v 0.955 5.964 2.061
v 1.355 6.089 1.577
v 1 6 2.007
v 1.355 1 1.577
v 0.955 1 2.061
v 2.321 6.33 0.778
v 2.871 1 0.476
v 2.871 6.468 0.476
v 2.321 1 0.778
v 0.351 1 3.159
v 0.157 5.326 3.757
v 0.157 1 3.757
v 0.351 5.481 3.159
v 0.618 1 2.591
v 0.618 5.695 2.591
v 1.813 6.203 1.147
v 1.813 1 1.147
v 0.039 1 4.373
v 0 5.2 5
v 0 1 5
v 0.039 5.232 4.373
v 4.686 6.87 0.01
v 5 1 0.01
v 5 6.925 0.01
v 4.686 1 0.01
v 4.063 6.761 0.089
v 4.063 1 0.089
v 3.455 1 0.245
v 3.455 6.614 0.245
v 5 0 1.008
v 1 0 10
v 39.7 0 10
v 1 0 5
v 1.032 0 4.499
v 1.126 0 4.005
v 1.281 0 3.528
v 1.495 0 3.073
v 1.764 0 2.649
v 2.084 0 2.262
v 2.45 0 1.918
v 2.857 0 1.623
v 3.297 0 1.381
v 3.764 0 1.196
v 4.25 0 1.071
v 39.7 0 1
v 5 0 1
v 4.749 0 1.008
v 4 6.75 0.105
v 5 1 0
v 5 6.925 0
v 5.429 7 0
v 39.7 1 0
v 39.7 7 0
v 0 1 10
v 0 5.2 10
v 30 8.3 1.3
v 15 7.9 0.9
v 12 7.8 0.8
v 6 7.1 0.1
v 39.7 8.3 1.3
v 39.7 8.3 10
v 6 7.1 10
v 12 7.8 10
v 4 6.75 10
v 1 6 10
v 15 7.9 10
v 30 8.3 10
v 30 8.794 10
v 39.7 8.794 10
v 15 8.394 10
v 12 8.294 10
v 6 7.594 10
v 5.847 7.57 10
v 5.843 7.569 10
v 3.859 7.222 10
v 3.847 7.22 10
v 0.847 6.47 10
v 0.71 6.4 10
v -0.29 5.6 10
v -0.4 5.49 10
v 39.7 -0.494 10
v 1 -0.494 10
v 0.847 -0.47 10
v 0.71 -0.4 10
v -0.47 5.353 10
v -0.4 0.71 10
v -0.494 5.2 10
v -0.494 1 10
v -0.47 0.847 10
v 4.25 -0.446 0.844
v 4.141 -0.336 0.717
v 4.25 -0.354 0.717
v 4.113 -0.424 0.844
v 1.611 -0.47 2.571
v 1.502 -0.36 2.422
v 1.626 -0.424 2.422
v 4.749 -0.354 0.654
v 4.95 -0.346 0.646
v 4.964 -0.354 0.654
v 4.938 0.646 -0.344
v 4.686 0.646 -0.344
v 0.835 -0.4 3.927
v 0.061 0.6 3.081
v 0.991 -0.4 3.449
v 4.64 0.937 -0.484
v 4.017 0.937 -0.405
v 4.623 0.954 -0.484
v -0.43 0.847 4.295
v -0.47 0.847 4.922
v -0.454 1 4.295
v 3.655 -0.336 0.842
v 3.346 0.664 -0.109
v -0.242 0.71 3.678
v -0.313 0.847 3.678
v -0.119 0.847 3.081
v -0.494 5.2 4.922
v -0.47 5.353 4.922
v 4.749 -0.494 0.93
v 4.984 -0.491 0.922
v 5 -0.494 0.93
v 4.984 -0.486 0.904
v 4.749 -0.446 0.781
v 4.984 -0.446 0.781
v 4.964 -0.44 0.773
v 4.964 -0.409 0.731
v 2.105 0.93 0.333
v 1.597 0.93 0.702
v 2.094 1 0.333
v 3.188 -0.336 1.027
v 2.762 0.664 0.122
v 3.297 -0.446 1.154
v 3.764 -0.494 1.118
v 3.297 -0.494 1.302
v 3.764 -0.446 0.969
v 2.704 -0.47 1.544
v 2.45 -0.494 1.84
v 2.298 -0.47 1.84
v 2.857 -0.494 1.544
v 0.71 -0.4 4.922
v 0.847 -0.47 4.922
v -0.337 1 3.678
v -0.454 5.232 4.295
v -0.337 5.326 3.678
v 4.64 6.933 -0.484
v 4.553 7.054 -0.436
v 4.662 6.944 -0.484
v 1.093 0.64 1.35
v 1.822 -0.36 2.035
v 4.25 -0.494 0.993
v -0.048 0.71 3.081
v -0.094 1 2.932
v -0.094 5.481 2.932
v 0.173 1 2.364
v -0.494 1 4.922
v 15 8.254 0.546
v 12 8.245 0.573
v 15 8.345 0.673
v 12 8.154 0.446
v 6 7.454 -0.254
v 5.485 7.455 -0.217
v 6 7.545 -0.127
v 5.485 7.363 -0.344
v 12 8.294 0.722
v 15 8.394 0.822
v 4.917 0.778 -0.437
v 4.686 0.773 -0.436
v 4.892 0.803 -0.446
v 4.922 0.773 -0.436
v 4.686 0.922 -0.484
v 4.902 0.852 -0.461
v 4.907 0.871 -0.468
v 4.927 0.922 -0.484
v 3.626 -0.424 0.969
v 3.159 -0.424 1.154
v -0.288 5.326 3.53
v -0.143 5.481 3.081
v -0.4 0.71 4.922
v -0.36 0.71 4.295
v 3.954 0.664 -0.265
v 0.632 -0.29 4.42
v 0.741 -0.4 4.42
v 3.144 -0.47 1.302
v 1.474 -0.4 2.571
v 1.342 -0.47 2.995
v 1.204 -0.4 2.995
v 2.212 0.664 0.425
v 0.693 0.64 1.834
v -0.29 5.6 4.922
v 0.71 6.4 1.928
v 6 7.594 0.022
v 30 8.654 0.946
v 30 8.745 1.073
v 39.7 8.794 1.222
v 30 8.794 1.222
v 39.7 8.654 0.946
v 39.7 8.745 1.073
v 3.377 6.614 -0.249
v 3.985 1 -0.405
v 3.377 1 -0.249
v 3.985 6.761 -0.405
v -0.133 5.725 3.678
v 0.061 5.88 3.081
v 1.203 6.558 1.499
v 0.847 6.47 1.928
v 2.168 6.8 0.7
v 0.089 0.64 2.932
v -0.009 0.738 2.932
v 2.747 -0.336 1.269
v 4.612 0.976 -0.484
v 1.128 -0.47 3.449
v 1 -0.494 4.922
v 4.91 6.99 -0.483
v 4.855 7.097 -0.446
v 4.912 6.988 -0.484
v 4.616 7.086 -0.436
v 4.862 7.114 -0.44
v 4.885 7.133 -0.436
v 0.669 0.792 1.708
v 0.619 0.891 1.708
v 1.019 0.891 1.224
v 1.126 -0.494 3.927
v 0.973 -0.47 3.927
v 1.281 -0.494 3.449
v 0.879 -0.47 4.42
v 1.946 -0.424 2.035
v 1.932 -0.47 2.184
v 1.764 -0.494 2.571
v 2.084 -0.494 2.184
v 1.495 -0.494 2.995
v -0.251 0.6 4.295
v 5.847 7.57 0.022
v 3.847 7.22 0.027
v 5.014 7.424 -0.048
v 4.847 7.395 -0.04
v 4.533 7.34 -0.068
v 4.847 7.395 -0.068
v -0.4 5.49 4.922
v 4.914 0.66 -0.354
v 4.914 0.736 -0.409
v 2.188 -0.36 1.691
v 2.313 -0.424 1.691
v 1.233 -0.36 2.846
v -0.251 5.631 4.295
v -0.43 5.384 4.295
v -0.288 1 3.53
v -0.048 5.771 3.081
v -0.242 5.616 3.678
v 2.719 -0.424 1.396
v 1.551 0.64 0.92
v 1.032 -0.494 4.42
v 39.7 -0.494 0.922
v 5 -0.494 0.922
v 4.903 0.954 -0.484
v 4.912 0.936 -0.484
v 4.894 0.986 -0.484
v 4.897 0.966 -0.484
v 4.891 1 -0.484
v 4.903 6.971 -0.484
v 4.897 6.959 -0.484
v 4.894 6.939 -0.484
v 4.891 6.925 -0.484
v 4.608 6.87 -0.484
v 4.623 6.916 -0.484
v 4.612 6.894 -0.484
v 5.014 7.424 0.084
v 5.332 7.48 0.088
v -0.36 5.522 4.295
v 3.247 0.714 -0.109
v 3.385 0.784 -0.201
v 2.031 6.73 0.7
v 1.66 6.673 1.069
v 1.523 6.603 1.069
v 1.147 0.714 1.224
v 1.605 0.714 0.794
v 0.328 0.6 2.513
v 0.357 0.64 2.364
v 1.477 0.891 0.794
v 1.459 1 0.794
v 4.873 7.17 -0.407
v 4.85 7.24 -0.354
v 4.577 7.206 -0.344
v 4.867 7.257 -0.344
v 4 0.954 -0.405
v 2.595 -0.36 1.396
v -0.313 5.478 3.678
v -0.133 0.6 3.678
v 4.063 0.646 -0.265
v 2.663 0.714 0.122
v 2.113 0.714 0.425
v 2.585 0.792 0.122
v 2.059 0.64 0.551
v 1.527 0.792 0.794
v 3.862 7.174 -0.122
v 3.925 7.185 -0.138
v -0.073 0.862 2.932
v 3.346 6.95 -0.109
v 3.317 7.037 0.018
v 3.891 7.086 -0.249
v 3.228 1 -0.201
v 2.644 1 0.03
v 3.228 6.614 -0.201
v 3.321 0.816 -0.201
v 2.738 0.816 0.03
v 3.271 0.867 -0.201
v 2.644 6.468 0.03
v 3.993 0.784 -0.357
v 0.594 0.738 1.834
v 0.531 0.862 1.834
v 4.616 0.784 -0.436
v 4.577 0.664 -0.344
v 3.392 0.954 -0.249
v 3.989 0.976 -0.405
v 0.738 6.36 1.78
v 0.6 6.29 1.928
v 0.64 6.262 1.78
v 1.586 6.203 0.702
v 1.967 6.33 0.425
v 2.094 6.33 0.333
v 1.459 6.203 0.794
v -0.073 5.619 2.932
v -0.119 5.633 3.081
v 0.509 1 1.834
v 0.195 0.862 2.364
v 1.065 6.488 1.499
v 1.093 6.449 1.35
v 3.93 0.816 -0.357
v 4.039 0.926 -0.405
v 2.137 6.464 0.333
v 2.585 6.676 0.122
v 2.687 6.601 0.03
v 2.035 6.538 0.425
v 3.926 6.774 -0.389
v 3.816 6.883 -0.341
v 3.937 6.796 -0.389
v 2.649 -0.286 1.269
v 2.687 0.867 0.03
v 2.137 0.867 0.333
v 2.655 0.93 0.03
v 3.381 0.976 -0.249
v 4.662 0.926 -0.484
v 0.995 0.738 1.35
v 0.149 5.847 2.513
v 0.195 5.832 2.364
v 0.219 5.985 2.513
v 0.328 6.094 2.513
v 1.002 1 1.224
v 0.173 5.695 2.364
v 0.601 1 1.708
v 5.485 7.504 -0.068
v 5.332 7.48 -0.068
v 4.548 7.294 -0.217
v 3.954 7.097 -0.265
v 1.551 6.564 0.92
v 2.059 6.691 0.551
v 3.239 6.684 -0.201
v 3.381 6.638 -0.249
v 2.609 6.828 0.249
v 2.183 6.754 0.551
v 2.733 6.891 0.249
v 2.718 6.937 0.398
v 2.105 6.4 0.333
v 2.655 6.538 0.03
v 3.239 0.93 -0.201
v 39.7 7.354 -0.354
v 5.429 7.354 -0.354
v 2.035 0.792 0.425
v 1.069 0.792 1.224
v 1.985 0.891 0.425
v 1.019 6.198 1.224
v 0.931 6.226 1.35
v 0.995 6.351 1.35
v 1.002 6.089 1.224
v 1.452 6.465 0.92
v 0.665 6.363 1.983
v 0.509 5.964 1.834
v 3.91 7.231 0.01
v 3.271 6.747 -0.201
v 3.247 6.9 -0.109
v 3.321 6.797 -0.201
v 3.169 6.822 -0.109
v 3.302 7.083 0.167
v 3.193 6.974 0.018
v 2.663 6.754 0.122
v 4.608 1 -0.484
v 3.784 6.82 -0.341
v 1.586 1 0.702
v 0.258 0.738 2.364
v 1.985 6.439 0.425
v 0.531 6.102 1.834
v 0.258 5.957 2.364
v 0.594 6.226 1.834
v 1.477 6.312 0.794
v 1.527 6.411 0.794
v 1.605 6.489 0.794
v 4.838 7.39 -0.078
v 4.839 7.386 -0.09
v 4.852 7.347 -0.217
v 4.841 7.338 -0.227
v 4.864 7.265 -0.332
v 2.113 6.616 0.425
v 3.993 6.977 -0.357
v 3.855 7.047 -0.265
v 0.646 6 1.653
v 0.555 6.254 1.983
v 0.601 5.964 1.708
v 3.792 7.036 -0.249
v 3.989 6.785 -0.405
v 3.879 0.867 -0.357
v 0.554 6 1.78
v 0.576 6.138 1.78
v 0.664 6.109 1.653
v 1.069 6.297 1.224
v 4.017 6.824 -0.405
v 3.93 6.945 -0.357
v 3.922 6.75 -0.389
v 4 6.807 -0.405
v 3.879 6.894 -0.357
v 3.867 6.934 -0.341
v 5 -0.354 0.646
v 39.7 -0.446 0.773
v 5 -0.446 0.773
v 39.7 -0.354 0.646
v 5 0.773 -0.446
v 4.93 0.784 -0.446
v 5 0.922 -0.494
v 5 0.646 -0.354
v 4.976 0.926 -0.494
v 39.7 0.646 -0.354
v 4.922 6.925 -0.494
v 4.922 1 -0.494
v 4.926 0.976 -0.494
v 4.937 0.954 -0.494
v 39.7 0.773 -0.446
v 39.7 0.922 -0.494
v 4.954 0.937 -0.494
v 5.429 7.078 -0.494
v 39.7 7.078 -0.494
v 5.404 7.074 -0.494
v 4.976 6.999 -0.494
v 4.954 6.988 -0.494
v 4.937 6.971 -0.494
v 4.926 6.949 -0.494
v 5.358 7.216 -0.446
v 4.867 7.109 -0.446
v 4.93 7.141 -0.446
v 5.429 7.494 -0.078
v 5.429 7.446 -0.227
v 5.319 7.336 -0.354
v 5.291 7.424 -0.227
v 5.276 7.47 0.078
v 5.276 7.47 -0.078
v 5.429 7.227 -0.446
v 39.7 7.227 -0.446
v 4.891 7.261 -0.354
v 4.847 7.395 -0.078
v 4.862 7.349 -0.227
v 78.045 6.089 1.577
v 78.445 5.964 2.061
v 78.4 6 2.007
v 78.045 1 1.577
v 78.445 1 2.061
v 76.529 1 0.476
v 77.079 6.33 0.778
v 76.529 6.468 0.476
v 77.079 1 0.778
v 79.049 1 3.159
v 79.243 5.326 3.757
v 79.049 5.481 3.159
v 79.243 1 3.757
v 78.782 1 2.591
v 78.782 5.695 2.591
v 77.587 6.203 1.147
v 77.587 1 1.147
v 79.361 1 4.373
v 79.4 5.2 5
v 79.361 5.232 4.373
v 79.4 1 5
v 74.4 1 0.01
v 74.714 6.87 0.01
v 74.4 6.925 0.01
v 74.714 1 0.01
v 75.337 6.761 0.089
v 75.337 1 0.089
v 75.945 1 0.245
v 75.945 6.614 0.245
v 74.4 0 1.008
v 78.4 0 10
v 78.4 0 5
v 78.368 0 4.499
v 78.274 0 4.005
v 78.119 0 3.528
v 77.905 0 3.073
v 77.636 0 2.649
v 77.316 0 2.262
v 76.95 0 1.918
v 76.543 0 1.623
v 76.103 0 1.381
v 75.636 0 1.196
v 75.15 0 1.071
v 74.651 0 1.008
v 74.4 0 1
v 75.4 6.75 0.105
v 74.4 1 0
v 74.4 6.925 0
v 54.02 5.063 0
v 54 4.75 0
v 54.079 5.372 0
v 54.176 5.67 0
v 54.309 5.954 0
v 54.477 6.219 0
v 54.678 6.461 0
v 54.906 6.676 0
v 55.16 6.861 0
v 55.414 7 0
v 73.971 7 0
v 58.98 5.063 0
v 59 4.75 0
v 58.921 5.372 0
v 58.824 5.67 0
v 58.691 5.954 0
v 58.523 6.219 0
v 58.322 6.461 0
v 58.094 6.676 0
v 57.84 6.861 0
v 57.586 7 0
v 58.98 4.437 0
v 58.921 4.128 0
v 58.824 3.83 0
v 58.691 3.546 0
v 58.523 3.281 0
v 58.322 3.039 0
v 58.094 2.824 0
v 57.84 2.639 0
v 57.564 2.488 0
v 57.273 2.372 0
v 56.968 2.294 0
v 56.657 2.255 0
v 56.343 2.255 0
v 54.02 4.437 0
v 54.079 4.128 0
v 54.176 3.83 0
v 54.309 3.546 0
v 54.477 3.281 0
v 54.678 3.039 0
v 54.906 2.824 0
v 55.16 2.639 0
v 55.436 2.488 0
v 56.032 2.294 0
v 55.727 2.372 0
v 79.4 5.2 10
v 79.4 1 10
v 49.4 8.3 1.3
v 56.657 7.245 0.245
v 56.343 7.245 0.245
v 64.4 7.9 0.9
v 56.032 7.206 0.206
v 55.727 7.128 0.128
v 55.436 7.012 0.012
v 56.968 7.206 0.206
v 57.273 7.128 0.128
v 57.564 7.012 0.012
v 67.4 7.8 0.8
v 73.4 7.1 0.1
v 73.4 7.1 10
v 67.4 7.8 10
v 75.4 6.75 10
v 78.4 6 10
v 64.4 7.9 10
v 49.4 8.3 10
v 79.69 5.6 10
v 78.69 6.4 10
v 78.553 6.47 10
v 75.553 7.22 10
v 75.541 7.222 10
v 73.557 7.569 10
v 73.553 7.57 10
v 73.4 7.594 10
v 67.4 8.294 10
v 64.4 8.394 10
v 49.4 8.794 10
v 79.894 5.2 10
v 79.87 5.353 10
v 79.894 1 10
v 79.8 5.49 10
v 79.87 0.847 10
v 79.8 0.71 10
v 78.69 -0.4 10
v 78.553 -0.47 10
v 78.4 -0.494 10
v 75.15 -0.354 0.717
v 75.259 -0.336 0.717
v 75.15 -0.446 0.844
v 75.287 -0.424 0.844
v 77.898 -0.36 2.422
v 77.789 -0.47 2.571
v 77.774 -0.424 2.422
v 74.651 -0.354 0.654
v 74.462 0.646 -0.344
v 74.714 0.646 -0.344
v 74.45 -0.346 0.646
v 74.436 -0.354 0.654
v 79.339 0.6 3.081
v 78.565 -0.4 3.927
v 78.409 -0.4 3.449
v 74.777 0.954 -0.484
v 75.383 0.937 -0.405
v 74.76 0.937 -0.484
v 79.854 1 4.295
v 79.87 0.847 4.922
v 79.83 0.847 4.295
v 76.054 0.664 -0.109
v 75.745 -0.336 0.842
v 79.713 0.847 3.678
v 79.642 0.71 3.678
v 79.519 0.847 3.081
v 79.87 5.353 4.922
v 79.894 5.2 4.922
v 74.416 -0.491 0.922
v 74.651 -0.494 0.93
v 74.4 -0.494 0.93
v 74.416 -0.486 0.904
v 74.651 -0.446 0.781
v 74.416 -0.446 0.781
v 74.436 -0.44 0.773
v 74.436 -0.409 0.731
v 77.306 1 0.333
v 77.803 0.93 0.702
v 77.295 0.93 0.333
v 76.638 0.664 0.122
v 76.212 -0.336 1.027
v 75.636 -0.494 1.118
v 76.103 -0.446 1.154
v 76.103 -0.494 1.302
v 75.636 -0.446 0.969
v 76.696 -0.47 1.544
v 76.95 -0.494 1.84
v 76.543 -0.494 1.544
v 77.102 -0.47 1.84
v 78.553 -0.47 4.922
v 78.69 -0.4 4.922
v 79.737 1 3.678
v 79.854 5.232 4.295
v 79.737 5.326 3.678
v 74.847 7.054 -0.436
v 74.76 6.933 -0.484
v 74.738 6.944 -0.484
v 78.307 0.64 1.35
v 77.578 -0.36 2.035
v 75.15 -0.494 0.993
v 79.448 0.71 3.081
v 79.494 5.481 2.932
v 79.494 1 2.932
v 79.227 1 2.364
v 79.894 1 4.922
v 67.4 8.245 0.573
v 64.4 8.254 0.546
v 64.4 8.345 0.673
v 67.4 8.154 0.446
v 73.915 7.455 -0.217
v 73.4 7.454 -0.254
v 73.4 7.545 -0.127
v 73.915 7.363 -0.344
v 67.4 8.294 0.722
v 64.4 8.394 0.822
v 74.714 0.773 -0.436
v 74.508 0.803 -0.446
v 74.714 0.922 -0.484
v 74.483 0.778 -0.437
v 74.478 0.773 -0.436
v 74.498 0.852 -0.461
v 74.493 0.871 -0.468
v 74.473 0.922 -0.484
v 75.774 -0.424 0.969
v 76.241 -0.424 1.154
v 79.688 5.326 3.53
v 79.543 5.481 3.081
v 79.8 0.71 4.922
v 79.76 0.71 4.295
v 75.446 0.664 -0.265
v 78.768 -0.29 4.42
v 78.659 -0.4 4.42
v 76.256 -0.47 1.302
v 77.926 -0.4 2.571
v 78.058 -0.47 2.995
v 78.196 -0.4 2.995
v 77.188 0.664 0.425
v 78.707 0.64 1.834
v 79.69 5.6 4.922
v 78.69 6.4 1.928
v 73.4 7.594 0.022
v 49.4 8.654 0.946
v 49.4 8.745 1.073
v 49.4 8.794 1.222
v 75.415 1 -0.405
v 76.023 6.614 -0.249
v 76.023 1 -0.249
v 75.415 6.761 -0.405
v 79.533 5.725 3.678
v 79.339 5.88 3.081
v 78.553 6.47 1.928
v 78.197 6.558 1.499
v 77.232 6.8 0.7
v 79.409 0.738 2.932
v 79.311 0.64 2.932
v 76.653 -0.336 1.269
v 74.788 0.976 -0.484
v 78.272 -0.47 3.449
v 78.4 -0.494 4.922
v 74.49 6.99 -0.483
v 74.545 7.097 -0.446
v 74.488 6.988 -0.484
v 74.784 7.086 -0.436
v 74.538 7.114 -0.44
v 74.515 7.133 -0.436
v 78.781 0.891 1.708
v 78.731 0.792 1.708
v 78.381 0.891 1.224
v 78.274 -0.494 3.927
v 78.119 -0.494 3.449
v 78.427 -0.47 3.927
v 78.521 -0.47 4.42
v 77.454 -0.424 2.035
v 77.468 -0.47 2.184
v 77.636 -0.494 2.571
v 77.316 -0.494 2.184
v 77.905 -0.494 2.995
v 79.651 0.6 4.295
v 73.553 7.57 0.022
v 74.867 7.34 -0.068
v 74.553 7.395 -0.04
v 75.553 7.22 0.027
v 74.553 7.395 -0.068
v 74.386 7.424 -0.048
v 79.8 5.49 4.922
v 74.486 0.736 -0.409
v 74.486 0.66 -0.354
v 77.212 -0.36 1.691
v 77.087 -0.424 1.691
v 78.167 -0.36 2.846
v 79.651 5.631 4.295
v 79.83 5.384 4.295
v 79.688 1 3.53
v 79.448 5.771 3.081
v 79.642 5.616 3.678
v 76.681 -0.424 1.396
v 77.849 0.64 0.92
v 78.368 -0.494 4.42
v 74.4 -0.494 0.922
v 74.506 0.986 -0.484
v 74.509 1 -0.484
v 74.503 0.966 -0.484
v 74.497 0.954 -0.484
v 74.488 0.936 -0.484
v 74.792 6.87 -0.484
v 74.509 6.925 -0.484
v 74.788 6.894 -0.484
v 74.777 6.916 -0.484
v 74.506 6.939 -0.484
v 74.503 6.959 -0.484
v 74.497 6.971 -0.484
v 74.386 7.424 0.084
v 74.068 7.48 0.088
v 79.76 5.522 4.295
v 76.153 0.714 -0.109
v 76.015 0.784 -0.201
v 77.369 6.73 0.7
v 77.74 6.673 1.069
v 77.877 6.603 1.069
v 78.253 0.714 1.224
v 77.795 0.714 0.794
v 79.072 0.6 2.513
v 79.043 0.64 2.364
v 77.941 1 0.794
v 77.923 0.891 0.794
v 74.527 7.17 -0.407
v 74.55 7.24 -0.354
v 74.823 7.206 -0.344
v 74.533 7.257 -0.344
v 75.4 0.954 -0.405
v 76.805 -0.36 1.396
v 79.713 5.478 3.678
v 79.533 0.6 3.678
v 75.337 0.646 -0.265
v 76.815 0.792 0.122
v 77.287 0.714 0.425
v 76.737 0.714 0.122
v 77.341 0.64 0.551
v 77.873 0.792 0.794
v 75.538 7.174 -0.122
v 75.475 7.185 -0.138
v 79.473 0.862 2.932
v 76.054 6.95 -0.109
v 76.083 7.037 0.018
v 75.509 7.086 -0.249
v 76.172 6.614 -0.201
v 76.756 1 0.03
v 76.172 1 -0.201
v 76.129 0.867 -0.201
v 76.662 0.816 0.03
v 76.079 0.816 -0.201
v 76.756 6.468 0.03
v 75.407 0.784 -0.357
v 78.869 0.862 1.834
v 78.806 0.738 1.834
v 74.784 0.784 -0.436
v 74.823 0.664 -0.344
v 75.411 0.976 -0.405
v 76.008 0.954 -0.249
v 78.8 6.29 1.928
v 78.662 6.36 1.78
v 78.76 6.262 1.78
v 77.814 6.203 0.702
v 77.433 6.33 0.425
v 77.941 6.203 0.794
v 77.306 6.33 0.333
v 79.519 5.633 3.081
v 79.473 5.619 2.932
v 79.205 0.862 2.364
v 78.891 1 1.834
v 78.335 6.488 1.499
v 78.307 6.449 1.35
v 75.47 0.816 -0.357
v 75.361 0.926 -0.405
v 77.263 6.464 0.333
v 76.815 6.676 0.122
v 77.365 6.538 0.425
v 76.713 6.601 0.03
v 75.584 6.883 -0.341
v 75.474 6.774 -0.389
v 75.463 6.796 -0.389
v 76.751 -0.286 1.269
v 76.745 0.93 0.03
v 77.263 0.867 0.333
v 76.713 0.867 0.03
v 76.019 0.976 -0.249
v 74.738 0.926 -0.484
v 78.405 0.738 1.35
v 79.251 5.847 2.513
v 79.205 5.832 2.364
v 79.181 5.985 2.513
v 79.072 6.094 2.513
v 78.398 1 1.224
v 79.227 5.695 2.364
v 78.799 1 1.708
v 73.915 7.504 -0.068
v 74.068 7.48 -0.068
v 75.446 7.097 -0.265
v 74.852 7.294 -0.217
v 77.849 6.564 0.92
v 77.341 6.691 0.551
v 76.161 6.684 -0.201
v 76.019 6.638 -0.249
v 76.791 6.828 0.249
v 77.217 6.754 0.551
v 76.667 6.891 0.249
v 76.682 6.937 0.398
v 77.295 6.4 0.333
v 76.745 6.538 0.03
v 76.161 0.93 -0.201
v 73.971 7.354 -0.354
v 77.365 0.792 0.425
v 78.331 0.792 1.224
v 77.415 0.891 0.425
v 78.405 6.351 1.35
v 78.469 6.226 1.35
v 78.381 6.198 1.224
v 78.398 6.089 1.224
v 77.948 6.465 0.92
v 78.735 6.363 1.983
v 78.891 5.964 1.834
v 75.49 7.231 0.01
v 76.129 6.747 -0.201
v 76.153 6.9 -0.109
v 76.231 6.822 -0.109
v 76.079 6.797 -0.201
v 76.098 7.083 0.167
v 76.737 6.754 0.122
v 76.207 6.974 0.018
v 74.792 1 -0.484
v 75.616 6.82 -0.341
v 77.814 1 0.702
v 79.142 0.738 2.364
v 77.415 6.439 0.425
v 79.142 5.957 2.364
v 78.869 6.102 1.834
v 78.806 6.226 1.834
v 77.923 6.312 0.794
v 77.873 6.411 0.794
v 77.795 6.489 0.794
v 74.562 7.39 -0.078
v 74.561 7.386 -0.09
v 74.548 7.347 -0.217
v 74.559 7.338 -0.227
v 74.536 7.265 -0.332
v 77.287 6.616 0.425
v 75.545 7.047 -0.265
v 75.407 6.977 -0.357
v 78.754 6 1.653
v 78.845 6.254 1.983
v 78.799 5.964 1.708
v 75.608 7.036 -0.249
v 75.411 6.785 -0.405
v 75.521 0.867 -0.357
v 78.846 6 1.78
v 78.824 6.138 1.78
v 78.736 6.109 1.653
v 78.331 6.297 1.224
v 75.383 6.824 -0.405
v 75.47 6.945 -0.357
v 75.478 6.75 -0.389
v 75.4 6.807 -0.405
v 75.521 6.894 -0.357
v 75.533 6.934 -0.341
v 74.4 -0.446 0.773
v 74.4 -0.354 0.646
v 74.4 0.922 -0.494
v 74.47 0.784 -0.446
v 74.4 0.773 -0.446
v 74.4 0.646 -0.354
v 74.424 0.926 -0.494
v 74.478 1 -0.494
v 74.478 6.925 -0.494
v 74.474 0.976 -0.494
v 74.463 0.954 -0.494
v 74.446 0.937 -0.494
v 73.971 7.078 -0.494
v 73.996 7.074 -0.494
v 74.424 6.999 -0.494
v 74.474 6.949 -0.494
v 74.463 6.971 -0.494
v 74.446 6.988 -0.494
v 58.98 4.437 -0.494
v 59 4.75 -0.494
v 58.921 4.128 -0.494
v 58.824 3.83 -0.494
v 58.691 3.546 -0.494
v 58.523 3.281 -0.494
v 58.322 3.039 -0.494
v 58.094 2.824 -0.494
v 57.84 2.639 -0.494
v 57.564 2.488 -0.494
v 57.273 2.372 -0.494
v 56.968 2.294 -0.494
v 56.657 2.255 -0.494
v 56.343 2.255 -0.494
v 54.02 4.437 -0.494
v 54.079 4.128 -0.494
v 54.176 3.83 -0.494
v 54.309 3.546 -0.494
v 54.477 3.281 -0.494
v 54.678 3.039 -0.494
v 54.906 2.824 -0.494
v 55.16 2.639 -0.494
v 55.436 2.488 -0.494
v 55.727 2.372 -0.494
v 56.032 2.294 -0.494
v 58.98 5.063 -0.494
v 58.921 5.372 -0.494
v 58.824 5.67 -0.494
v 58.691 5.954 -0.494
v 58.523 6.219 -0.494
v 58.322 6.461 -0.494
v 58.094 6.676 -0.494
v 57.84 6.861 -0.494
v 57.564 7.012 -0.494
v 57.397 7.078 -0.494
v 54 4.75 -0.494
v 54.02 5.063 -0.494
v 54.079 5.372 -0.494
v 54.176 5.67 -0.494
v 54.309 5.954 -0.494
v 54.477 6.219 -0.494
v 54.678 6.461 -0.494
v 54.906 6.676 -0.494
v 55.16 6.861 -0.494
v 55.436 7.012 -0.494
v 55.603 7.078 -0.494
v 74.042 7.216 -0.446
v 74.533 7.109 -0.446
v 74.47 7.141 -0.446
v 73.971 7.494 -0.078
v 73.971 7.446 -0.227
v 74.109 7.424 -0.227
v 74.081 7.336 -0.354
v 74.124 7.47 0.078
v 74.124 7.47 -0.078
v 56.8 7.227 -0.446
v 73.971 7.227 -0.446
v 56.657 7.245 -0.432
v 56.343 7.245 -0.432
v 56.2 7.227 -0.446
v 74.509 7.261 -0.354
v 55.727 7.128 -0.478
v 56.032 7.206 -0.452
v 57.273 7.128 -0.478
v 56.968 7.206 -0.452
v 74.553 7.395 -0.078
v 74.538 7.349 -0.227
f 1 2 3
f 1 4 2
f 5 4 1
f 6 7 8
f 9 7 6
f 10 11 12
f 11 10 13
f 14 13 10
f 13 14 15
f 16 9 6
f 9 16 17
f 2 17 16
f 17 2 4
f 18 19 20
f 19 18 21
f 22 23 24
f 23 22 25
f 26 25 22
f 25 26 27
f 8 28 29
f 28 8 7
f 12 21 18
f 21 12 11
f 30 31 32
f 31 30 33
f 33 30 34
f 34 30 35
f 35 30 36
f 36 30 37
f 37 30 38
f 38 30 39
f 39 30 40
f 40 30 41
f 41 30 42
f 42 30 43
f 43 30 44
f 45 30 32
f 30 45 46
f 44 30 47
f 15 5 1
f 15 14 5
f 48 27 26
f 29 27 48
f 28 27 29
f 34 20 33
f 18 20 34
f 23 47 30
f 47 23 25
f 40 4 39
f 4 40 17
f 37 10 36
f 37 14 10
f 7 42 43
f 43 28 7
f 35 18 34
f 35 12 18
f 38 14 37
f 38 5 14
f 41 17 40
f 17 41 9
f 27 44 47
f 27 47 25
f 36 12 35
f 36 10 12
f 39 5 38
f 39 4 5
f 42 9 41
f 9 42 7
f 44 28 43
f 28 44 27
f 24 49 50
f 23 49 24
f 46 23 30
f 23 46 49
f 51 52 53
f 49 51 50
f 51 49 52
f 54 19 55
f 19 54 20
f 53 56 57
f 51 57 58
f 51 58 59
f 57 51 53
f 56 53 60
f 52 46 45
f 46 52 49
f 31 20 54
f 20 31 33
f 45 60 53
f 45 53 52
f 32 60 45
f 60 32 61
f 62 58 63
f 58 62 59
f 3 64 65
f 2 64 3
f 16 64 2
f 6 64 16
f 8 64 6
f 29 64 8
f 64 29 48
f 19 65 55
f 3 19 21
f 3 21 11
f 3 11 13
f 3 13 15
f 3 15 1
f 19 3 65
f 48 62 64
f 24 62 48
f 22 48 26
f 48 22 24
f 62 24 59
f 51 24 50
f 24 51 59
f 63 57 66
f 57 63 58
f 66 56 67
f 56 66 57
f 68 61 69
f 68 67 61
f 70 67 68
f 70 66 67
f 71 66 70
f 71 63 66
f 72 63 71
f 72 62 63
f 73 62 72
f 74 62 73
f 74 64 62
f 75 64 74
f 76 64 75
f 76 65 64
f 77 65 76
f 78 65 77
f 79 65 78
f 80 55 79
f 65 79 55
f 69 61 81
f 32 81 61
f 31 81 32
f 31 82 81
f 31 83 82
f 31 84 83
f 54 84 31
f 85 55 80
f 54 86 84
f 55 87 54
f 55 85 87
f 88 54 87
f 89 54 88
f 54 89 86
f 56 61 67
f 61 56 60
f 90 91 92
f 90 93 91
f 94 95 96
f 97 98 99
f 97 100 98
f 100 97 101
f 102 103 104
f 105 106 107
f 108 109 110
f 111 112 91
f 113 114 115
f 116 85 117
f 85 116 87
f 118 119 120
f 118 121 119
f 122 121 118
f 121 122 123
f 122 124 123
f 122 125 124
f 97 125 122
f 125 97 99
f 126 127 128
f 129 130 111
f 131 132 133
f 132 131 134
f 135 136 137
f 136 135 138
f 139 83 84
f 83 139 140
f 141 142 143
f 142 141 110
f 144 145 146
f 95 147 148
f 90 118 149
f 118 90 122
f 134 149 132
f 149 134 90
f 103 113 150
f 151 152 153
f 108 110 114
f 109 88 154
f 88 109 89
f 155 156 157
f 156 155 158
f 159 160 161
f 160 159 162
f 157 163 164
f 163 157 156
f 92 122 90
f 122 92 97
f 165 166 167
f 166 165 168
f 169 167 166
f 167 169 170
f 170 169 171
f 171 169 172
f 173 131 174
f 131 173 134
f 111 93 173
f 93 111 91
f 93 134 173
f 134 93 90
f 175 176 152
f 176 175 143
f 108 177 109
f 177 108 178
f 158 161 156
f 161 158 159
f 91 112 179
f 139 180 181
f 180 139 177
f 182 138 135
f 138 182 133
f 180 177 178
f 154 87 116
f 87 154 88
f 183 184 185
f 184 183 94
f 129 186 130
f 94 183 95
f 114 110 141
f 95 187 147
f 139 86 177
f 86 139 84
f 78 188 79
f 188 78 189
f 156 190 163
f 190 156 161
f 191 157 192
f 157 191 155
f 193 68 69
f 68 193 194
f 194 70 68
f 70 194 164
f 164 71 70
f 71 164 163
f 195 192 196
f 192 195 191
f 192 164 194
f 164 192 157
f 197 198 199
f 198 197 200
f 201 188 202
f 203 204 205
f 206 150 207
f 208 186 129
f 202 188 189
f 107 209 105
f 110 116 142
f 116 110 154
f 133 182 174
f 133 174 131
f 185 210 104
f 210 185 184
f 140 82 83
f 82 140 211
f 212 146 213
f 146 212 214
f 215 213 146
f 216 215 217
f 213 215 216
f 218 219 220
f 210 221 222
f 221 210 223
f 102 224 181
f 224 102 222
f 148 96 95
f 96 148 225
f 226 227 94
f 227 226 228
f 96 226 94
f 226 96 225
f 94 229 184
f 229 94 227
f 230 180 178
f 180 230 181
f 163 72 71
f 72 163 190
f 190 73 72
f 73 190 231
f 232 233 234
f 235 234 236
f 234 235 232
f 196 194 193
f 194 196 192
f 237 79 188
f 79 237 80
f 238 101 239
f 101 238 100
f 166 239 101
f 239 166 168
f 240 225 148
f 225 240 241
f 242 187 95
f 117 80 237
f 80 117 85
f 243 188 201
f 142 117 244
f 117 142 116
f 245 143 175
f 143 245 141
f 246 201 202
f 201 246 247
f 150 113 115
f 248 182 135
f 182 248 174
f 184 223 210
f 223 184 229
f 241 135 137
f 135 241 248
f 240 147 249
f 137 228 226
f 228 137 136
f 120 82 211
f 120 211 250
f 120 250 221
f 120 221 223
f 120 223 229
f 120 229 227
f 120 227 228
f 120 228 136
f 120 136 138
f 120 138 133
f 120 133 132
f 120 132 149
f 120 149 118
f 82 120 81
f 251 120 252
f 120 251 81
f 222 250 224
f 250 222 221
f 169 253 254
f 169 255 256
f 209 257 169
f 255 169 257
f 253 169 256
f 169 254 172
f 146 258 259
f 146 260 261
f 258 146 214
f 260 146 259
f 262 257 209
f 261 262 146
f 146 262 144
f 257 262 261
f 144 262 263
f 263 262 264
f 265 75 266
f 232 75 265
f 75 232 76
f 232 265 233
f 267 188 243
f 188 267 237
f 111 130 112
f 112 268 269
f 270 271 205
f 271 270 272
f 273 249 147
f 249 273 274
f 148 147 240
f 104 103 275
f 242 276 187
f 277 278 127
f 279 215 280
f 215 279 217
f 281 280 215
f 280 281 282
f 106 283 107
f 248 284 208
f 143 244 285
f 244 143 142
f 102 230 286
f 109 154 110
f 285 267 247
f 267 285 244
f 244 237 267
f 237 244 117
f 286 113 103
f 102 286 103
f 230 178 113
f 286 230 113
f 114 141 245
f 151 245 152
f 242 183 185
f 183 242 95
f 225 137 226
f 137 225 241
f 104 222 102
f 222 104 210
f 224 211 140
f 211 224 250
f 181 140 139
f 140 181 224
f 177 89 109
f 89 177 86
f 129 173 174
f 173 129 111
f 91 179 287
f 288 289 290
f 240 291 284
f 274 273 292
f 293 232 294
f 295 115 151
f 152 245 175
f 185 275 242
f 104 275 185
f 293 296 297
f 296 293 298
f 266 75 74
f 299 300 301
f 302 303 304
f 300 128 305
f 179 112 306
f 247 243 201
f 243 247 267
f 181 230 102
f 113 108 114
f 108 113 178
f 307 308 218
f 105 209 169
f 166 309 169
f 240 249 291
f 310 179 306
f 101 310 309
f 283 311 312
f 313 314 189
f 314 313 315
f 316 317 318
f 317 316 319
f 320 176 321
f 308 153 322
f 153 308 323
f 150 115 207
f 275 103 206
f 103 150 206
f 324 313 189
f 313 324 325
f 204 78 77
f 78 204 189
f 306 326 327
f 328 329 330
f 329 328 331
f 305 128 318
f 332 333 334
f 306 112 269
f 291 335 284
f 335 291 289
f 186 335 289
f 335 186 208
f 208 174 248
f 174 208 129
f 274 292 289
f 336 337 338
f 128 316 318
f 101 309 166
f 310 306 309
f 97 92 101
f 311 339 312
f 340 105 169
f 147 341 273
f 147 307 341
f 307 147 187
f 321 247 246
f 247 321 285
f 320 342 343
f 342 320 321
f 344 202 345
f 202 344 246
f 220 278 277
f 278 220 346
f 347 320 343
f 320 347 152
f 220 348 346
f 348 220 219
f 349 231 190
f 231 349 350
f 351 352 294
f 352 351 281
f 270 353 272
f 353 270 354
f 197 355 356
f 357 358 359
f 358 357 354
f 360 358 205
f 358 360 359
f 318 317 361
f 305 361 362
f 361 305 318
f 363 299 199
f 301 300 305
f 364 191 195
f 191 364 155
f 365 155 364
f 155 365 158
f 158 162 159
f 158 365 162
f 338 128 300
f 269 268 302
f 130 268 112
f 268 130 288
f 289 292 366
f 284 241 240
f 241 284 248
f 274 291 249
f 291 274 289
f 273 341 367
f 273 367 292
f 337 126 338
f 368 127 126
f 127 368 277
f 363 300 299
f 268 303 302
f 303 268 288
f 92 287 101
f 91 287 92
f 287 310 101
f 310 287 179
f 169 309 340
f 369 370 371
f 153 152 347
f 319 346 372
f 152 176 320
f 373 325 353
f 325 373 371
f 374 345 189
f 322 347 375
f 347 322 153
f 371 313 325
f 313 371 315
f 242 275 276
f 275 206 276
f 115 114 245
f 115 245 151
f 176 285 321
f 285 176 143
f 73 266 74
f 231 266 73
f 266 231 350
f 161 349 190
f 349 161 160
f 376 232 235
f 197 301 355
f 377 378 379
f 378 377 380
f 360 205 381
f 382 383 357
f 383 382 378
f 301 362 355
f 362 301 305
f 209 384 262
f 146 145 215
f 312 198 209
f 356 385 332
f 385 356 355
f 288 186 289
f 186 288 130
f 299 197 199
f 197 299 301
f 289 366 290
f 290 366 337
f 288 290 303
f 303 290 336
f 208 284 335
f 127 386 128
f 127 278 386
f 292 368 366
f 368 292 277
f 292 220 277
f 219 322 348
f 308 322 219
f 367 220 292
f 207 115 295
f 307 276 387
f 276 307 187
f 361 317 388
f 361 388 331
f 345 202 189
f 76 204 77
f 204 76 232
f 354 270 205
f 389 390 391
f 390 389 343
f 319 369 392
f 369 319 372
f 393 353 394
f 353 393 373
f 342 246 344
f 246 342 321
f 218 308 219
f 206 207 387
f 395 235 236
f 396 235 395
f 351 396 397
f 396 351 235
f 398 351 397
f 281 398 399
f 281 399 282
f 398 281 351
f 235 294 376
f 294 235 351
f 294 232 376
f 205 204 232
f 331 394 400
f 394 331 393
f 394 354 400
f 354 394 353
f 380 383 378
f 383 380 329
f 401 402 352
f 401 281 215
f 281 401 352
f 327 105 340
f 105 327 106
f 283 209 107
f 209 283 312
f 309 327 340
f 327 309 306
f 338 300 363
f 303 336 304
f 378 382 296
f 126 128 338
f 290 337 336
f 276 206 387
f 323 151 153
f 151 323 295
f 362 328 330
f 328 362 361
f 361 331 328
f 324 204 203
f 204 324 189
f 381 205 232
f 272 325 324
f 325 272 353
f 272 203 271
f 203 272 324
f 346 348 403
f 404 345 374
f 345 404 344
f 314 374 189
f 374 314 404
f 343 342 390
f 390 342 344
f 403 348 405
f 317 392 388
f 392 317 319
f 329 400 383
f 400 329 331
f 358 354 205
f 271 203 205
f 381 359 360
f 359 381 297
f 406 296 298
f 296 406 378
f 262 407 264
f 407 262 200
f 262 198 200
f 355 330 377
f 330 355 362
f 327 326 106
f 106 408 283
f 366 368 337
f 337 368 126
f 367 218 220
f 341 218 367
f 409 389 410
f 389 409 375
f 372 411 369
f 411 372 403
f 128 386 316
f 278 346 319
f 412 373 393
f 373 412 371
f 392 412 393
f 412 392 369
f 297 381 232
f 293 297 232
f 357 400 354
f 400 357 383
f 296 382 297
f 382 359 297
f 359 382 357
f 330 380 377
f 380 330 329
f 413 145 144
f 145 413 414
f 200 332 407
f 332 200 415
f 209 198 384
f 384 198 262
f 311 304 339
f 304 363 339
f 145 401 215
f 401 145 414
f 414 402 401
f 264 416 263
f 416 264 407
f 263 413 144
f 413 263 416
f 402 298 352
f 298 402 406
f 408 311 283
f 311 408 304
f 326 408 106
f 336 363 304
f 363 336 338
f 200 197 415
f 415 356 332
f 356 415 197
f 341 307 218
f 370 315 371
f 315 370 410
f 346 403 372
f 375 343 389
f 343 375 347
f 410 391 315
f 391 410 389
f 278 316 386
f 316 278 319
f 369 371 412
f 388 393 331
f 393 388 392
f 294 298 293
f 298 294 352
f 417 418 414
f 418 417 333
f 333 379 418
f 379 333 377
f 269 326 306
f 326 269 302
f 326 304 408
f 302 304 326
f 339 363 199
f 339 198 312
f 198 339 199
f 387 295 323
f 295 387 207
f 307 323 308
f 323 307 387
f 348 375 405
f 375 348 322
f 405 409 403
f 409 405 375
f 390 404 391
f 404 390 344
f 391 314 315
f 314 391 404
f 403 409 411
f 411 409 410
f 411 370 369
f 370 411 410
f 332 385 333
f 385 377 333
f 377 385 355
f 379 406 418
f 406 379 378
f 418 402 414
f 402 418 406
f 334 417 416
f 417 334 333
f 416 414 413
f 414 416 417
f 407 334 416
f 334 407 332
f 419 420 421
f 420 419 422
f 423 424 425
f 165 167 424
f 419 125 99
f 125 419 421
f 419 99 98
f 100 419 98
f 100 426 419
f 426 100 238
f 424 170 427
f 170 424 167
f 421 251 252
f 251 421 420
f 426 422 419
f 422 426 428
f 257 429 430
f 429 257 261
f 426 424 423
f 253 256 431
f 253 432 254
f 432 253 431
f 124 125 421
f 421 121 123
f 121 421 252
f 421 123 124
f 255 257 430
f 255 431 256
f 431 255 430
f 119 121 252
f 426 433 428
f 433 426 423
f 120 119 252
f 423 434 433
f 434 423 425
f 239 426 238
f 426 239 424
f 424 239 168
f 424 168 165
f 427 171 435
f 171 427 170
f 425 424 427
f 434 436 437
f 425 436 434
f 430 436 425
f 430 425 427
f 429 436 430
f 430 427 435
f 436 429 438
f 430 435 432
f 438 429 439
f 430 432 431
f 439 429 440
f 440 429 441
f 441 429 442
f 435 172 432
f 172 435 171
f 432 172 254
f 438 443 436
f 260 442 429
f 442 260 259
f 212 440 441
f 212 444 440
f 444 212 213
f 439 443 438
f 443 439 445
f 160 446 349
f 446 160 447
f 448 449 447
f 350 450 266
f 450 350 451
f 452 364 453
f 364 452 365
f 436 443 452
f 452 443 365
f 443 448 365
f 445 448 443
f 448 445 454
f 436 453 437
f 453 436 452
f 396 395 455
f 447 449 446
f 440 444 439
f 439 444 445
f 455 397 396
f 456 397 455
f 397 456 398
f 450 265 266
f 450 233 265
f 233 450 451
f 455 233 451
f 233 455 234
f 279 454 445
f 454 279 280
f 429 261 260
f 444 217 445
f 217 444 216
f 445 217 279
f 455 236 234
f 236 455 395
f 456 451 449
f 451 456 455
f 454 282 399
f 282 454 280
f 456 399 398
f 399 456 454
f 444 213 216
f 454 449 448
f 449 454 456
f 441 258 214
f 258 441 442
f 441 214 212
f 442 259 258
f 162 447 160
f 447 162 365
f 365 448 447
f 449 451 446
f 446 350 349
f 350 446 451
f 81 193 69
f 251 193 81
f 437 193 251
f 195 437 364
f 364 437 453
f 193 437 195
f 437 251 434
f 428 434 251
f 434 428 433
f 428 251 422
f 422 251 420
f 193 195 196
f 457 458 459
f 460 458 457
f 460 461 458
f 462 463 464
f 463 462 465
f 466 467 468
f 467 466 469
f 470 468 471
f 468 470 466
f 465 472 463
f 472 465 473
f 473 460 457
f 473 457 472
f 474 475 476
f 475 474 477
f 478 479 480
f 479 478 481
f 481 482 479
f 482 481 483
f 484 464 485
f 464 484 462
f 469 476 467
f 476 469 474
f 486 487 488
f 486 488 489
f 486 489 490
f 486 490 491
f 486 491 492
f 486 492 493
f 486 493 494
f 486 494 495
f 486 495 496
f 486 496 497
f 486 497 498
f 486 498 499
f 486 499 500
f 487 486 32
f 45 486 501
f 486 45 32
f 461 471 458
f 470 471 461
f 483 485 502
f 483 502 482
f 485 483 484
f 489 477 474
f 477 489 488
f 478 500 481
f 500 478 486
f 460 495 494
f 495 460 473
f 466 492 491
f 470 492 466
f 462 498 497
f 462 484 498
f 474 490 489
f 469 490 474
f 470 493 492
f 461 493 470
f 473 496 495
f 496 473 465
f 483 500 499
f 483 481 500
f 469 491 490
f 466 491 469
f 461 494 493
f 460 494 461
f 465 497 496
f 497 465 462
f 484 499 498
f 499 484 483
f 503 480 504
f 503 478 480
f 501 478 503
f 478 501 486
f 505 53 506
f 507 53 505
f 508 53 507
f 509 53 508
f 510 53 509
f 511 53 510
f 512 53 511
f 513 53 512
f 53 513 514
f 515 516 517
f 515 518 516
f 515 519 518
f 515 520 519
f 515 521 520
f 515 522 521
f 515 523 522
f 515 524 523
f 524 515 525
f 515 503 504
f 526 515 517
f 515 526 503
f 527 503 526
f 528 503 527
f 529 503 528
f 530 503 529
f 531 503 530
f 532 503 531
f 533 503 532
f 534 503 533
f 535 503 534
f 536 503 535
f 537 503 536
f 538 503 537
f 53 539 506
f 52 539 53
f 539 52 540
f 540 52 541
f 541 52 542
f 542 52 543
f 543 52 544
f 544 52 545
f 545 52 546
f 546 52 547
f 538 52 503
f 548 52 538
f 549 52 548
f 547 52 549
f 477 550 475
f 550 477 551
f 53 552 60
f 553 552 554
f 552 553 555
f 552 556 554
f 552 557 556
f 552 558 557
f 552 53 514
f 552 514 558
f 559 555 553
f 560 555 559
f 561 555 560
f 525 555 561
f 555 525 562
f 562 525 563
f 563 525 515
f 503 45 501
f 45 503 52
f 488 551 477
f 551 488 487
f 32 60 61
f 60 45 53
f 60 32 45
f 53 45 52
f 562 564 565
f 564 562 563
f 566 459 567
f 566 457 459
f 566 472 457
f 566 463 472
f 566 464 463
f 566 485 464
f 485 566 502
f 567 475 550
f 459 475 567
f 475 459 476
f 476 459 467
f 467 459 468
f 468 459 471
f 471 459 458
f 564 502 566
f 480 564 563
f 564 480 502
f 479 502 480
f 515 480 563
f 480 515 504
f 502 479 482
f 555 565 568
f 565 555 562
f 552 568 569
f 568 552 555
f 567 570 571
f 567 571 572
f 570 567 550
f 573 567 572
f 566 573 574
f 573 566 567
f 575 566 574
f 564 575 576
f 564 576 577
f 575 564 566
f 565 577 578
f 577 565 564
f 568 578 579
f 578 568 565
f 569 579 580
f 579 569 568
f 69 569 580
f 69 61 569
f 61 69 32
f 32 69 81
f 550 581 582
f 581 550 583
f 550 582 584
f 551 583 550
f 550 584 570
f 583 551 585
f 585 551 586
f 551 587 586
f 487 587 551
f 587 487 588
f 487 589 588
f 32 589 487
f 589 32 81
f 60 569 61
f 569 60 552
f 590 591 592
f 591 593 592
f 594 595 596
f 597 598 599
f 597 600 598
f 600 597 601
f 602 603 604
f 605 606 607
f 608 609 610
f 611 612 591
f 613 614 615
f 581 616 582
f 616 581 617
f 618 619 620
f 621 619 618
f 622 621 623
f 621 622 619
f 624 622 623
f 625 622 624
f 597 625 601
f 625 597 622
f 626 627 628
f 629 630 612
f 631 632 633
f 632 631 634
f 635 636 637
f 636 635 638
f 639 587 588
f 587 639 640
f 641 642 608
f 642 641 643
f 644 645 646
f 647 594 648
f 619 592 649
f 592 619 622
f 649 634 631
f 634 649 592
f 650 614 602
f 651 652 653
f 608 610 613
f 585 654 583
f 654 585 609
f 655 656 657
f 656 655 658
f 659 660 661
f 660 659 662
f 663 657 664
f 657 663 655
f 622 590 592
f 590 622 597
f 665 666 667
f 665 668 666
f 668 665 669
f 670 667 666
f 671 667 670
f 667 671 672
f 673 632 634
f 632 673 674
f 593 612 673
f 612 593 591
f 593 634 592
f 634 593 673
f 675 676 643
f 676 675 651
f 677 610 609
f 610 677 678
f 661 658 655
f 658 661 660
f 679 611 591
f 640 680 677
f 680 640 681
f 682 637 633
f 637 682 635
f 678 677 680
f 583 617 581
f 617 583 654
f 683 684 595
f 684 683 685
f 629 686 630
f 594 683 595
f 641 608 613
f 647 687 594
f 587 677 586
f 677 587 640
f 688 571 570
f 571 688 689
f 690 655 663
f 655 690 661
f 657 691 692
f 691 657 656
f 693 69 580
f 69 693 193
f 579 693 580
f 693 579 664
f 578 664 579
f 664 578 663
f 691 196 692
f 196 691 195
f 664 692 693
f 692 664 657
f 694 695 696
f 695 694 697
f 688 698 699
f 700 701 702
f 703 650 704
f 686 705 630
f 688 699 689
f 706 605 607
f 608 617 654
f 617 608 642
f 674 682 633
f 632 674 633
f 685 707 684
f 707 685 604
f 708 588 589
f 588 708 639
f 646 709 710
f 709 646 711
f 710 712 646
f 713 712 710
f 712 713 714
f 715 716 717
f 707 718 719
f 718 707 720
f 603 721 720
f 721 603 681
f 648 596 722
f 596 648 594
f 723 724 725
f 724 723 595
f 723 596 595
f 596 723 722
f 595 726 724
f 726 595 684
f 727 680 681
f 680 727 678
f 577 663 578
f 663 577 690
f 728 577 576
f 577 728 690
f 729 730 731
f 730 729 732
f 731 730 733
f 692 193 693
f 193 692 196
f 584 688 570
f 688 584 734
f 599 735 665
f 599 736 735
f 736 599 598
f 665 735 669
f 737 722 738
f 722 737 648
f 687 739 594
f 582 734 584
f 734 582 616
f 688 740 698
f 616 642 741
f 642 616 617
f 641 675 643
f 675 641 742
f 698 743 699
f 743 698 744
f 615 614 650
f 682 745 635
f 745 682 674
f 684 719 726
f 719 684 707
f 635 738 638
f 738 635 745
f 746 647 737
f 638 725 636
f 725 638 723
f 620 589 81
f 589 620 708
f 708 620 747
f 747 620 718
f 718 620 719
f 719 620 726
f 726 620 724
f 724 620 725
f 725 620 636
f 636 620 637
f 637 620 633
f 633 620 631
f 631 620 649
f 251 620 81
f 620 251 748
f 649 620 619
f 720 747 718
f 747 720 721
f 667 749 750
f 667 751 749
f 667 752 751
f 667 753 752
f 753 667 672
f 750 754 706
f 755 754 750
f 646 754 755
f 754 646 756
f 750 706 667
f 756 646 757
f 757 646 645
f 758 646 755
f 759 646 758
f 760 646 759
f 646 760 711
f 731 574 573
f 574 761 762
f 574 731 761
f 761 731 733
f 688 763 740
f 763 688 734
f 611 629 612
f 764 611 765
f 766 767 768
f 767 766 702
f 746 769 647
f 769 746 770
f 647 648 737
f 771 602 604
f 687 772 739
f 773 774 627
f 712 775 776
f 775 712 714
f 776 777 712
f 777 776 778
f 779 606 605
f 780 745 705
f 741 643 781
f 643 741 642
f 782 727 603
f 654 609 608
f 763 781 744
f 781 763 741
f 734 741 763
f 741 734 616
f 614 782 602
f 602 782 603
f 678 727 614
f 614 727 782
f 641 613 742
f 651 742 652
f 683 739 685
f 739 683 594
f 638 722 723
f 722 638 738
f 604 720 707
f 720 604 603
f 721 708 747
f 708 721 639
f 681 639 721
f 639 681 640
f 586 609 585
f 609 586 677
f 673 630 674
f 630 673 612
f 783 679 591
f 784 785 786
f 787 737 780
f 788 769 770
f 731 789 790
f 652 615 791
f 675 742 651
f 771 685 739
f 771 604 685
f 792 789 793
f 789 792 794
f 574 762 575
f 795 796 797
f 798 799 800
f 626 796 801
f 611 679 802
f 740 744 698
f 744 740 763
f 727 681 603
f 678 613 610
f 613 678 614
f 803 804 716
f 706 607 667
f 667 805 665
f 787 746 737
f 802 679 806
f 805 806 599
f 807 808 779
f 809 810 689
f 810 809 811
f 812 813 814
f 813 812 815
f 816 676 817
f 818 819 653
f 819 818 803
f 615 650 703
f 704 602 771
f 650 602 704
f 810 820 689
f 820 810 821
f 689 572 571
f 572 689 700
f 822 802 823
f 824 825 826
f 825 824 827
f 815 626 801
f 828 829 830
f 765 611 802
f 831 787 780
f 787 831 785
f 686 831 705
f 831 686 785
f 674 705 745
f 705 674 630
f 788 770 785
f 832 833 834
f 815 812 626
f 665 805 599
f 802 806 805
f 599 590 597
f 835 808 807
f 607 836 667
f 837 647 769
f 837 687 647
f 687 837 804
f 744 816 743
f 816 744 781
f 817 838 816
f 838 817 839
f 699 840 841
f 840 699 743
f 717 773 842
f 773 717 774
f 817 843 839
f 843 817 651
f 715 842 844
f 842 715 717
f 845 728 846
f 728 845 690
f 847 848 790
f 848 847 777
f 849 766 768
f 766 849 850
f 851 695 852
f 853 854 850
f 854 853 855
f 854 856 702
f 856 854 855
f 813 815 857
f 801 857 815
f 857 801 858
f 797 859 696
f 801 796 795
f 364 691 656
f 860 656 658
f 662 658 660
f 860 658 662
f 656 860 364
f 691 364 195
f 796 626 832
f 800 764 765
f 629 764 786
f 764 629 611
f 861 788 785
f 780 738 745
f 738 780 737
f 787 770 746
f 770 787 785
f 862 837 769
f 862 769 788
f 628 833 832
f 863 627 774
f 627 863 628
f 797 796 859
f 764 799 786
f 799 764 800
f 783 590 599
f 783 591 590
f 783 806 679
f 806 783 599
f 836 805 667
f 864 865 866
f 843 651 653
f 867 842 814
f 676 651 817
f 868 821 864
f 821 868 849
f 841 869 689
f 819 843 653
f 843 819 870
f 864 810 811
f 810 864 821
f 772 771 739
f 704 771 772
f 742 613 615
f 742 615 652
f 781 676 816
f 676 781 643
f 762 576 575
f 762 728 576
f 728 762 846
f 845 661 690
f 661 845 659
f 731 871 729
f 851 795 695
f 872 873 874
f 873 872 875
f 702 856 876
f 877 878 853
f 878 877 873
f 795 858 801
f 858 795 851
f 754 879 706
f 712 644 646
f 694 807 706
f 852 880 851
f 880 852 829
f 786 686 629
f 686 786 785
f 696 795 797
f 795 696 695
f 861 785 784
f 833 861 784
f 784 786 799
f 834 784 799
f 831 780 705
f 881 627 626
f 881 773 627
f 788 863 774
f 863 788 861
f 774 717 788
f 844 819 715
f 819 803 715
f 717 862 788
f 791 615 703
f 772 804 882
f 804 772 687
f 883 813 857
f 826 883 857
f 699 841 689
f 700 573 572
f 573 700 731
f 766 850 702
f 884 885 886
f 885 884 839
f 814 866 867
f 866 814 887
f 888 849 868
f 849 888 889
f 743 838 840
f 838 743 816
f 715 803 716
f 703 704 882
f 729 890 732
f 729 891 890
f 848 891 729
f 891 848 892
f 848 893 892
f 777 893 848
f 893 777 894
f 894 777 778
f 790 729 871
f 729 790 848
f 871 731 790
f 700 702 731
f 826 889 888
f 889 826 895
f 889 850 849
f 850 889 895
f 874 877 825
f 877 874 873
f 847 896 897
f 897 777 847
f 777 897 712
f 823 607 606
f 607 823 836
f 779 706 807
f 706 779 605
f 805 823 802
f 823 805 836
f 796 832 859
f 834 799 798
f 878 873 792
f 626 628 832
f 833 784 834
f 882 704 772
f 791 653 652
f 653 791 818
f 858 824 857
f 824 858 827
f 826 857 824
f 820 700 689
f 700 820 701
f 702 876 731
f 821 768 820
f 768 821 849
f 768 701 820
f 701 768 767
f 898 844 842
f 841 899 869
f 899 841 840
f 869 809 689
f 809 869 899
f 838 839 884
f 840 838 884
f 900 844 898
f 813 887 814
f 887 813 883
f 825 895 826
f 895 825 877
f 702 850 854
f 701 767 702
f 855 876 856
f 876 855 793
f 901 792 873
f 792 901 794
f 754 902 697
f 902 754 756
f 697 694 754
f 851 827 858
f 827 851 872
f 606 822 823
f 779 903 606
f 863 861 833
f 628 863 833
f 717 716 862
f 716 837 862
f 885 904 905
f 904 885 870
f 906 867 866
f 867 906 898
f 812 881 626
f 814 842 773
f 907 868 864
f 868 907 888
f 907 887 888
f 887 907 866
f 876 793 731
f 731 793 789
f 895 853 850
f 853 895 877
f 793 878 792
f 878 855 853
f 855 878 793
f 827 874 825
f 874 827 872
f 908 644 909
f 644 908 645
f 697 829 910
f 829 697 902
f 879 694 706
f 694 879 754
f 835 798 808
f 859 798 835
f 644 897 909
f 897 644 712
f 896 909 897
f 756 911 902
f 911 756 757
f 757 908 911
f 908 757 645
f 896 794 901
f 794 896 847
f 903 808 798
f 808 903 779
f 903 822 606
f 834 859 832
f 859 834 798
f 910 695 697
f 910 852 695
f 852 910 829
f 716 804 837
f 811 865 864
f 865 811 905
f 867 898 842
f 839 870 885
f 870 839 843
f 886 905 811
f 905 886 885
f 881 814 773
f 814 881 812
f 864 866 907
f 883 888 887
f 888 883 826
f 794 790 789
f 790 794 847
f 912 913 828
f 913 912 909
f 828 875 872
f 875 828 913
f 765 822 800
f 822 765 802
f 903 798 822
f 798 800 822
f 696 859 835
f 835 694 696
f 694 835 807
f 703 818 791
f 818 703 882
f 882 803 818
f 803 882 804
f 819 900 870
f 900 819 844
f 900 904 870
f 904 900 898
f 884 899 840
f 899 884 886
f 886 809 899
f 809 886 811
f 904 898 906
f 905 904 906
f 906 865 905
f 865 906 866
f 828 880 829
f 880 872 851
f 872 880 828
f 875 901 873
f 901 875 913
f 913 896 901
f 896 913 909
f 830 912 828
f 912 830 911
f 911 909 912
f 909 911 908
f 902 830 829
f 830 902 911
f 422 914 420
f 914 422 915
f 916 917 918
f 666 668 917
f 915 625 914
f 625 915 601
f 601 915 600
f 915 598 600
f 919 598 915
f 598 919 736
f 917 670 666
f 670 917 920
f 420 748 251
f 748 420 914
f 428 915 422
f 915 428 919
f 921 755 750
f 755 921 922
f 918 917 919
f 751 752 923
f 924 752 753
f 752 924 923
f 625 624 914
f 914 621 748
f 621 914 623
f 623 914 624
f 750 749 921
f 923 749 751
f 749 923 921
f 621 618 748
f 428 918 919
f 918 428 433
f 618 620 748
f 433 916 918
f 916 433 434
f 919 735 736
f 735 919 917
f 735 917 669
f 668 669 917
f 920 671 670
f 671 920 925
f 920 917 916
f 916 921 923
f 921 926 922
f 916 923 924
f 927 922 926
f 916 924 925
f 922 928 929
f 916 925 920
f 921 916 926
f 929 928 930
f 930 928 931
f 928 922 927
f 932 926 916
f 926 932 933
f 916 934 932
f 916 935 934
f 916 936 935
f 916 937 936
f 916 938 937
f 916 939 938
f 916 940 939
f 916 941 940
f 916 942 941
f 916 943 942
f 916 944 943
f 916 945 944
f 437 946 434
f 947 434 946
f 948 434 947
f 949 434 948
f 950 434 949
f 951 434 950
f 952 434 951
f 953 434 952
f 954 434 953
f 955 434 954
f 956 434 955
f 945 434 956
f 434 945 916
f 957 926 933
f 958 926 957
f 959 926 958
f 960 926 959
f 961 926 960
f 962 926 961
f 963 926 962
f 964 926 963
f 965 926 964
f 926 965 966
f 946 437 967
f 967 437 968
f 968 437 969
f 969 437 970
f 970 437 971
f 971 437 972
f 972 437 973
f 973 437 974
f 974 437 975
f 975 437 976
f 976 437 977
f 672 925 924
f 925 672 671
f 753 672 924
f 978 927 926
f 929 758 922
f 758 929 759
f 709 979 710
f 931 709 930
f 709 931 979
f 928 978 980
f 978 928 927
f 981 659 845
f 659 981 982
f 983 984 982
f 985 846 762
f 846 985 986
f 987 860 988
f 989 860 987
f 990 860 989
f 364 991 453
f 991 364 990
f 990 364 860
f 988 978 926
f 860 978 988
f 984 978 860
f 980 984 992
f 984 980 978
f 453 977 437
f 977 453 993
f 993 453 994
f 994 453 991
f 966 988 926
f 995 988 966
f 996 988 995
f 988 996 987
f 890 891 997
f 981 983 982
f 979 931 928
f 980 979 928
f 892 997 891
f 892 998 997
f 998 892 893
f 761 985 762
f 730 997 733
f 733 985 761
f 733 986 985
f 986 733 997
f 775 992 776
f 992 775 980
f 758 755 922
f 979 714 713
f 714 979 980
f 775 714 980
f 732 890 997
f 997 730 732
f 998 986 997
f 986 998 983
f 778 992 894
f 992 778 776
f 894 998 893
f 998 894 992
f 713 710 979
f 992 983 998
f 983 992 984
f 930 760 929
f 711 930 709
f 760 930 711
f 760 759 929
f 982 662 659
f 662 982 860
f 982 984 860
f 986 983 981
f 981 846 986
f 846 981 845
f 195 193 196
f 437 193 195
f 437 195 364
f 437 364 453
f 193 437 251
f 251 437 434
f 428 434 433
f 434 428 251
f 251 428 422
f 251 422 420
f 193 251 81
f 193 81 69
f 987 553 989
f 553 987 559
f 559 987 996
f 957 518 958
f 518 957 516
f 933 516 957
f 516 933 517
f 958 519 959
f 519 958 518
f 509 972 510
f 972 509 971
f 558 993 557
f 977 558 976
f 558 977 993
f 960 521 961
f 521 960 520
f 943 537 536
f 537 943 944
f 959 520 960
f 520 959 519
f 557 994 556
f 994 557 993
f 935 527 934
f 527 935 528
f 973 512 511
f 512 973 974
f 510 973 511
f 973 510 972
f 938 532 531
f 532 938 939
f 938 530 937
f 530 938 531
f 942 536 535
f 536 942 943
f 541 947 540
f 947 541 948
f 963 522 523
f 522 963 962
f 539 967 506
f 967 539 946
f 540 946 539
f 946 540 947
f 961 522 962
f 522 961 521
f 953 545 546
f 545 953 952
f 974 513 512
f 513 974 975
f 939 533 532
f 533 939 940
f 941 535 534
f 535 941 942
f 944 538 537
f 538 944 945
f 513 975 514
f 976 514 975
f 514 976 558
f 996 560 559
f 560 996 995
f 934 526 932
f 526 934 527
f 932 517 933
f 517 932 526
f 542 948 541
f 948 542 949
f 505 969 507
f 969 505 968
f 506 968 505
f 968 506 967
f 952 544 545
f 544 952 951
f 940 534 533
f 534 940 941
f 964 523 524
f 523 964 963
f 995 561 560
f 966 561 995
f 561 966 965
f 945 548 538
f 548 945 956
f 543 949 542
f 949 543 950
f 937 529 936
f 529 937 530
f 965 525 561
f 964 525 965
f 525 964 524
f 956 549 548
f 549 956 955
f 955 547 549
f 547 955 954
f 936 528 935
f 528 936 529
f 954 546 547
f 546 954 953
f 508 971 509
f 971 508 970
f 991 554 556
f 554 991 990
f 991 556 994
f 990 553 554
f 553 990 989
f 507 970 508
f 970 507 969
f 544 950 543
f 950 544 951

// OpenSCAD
w=80-0.6;
thickness = 0.5;

top();
//bottom();

module bottom() {
    difference() {
        union() {
        half(13);
        translate([w, 0]) mirror([1, 0]) half(13);
    }
    translate([w/2, 3, -thickness-1]) type_c(thickness+2);
    
    }
}
module top() {
    difference() {
        union() {
            half(10);
            translate([w, 0]) mirror([1, 0]) half(10);
        }
        translate([56.5, 3+3.5/2, -thickness-1]) cylinder(d=5, h = thickness+2, $fn=50);
        
        /*translate([w/2, 0, 5]) rotate([90, 0]) linear_extrude(height=thickness) offset(r=2, $fn=50) offset(delta=-2) 
            polygon([[-13/2, 0], [13/2, 0], [(13+8)/2, 10], [-(13+8)/2, 10]]);*/
    }
}

module half(h) difference() {
    intersection() {
        minkowski() {
            half_inner(h);
            sphere(d=thickness*2, $fn=20);
        }
        translate([-thickness, -thickness, -thickness]) cube([w/2+thickness, 100, h+thickness]);
    }
    half_inner(h);
}


module half_inner(h) {
        intersection() {
            linear_extrude(height=h) polygon([[0, 1], [0, 6-0.8],[1, 6], [3, 6.5], [4, 6.75], 
             [6, 7.1], [12, 7.8], [15, 7.9],  
             [30, 8.3], [w/2, 8.3], [w/2, 0], [1, 0]]);

            difference() {
                translate([0, 3+1, 20-3]) rotate([0, 90]) cylinder(r=20, h=w, $fn=4);
                corner($fn=50);
            }
        }
}

module corner() difference() {
    cube([5, 10, 5]);
    translate([5, 0, 5]) rotate([-90, 0]) intersection() {
        cylinder(r=5, h=10);
        translate([0, 0, -4]) cylinder(r1=0, r2=10*10, h=10*10);
    }
}

module type_c(h) translate([2.83/2-8.55/2, 2.83/2]) hull() {
    $fn=30;
    cylinder(d=2.83,h=h);
    translate([8.55-2.83, 0]) cylinder(d=2.83, h=h);
 }
